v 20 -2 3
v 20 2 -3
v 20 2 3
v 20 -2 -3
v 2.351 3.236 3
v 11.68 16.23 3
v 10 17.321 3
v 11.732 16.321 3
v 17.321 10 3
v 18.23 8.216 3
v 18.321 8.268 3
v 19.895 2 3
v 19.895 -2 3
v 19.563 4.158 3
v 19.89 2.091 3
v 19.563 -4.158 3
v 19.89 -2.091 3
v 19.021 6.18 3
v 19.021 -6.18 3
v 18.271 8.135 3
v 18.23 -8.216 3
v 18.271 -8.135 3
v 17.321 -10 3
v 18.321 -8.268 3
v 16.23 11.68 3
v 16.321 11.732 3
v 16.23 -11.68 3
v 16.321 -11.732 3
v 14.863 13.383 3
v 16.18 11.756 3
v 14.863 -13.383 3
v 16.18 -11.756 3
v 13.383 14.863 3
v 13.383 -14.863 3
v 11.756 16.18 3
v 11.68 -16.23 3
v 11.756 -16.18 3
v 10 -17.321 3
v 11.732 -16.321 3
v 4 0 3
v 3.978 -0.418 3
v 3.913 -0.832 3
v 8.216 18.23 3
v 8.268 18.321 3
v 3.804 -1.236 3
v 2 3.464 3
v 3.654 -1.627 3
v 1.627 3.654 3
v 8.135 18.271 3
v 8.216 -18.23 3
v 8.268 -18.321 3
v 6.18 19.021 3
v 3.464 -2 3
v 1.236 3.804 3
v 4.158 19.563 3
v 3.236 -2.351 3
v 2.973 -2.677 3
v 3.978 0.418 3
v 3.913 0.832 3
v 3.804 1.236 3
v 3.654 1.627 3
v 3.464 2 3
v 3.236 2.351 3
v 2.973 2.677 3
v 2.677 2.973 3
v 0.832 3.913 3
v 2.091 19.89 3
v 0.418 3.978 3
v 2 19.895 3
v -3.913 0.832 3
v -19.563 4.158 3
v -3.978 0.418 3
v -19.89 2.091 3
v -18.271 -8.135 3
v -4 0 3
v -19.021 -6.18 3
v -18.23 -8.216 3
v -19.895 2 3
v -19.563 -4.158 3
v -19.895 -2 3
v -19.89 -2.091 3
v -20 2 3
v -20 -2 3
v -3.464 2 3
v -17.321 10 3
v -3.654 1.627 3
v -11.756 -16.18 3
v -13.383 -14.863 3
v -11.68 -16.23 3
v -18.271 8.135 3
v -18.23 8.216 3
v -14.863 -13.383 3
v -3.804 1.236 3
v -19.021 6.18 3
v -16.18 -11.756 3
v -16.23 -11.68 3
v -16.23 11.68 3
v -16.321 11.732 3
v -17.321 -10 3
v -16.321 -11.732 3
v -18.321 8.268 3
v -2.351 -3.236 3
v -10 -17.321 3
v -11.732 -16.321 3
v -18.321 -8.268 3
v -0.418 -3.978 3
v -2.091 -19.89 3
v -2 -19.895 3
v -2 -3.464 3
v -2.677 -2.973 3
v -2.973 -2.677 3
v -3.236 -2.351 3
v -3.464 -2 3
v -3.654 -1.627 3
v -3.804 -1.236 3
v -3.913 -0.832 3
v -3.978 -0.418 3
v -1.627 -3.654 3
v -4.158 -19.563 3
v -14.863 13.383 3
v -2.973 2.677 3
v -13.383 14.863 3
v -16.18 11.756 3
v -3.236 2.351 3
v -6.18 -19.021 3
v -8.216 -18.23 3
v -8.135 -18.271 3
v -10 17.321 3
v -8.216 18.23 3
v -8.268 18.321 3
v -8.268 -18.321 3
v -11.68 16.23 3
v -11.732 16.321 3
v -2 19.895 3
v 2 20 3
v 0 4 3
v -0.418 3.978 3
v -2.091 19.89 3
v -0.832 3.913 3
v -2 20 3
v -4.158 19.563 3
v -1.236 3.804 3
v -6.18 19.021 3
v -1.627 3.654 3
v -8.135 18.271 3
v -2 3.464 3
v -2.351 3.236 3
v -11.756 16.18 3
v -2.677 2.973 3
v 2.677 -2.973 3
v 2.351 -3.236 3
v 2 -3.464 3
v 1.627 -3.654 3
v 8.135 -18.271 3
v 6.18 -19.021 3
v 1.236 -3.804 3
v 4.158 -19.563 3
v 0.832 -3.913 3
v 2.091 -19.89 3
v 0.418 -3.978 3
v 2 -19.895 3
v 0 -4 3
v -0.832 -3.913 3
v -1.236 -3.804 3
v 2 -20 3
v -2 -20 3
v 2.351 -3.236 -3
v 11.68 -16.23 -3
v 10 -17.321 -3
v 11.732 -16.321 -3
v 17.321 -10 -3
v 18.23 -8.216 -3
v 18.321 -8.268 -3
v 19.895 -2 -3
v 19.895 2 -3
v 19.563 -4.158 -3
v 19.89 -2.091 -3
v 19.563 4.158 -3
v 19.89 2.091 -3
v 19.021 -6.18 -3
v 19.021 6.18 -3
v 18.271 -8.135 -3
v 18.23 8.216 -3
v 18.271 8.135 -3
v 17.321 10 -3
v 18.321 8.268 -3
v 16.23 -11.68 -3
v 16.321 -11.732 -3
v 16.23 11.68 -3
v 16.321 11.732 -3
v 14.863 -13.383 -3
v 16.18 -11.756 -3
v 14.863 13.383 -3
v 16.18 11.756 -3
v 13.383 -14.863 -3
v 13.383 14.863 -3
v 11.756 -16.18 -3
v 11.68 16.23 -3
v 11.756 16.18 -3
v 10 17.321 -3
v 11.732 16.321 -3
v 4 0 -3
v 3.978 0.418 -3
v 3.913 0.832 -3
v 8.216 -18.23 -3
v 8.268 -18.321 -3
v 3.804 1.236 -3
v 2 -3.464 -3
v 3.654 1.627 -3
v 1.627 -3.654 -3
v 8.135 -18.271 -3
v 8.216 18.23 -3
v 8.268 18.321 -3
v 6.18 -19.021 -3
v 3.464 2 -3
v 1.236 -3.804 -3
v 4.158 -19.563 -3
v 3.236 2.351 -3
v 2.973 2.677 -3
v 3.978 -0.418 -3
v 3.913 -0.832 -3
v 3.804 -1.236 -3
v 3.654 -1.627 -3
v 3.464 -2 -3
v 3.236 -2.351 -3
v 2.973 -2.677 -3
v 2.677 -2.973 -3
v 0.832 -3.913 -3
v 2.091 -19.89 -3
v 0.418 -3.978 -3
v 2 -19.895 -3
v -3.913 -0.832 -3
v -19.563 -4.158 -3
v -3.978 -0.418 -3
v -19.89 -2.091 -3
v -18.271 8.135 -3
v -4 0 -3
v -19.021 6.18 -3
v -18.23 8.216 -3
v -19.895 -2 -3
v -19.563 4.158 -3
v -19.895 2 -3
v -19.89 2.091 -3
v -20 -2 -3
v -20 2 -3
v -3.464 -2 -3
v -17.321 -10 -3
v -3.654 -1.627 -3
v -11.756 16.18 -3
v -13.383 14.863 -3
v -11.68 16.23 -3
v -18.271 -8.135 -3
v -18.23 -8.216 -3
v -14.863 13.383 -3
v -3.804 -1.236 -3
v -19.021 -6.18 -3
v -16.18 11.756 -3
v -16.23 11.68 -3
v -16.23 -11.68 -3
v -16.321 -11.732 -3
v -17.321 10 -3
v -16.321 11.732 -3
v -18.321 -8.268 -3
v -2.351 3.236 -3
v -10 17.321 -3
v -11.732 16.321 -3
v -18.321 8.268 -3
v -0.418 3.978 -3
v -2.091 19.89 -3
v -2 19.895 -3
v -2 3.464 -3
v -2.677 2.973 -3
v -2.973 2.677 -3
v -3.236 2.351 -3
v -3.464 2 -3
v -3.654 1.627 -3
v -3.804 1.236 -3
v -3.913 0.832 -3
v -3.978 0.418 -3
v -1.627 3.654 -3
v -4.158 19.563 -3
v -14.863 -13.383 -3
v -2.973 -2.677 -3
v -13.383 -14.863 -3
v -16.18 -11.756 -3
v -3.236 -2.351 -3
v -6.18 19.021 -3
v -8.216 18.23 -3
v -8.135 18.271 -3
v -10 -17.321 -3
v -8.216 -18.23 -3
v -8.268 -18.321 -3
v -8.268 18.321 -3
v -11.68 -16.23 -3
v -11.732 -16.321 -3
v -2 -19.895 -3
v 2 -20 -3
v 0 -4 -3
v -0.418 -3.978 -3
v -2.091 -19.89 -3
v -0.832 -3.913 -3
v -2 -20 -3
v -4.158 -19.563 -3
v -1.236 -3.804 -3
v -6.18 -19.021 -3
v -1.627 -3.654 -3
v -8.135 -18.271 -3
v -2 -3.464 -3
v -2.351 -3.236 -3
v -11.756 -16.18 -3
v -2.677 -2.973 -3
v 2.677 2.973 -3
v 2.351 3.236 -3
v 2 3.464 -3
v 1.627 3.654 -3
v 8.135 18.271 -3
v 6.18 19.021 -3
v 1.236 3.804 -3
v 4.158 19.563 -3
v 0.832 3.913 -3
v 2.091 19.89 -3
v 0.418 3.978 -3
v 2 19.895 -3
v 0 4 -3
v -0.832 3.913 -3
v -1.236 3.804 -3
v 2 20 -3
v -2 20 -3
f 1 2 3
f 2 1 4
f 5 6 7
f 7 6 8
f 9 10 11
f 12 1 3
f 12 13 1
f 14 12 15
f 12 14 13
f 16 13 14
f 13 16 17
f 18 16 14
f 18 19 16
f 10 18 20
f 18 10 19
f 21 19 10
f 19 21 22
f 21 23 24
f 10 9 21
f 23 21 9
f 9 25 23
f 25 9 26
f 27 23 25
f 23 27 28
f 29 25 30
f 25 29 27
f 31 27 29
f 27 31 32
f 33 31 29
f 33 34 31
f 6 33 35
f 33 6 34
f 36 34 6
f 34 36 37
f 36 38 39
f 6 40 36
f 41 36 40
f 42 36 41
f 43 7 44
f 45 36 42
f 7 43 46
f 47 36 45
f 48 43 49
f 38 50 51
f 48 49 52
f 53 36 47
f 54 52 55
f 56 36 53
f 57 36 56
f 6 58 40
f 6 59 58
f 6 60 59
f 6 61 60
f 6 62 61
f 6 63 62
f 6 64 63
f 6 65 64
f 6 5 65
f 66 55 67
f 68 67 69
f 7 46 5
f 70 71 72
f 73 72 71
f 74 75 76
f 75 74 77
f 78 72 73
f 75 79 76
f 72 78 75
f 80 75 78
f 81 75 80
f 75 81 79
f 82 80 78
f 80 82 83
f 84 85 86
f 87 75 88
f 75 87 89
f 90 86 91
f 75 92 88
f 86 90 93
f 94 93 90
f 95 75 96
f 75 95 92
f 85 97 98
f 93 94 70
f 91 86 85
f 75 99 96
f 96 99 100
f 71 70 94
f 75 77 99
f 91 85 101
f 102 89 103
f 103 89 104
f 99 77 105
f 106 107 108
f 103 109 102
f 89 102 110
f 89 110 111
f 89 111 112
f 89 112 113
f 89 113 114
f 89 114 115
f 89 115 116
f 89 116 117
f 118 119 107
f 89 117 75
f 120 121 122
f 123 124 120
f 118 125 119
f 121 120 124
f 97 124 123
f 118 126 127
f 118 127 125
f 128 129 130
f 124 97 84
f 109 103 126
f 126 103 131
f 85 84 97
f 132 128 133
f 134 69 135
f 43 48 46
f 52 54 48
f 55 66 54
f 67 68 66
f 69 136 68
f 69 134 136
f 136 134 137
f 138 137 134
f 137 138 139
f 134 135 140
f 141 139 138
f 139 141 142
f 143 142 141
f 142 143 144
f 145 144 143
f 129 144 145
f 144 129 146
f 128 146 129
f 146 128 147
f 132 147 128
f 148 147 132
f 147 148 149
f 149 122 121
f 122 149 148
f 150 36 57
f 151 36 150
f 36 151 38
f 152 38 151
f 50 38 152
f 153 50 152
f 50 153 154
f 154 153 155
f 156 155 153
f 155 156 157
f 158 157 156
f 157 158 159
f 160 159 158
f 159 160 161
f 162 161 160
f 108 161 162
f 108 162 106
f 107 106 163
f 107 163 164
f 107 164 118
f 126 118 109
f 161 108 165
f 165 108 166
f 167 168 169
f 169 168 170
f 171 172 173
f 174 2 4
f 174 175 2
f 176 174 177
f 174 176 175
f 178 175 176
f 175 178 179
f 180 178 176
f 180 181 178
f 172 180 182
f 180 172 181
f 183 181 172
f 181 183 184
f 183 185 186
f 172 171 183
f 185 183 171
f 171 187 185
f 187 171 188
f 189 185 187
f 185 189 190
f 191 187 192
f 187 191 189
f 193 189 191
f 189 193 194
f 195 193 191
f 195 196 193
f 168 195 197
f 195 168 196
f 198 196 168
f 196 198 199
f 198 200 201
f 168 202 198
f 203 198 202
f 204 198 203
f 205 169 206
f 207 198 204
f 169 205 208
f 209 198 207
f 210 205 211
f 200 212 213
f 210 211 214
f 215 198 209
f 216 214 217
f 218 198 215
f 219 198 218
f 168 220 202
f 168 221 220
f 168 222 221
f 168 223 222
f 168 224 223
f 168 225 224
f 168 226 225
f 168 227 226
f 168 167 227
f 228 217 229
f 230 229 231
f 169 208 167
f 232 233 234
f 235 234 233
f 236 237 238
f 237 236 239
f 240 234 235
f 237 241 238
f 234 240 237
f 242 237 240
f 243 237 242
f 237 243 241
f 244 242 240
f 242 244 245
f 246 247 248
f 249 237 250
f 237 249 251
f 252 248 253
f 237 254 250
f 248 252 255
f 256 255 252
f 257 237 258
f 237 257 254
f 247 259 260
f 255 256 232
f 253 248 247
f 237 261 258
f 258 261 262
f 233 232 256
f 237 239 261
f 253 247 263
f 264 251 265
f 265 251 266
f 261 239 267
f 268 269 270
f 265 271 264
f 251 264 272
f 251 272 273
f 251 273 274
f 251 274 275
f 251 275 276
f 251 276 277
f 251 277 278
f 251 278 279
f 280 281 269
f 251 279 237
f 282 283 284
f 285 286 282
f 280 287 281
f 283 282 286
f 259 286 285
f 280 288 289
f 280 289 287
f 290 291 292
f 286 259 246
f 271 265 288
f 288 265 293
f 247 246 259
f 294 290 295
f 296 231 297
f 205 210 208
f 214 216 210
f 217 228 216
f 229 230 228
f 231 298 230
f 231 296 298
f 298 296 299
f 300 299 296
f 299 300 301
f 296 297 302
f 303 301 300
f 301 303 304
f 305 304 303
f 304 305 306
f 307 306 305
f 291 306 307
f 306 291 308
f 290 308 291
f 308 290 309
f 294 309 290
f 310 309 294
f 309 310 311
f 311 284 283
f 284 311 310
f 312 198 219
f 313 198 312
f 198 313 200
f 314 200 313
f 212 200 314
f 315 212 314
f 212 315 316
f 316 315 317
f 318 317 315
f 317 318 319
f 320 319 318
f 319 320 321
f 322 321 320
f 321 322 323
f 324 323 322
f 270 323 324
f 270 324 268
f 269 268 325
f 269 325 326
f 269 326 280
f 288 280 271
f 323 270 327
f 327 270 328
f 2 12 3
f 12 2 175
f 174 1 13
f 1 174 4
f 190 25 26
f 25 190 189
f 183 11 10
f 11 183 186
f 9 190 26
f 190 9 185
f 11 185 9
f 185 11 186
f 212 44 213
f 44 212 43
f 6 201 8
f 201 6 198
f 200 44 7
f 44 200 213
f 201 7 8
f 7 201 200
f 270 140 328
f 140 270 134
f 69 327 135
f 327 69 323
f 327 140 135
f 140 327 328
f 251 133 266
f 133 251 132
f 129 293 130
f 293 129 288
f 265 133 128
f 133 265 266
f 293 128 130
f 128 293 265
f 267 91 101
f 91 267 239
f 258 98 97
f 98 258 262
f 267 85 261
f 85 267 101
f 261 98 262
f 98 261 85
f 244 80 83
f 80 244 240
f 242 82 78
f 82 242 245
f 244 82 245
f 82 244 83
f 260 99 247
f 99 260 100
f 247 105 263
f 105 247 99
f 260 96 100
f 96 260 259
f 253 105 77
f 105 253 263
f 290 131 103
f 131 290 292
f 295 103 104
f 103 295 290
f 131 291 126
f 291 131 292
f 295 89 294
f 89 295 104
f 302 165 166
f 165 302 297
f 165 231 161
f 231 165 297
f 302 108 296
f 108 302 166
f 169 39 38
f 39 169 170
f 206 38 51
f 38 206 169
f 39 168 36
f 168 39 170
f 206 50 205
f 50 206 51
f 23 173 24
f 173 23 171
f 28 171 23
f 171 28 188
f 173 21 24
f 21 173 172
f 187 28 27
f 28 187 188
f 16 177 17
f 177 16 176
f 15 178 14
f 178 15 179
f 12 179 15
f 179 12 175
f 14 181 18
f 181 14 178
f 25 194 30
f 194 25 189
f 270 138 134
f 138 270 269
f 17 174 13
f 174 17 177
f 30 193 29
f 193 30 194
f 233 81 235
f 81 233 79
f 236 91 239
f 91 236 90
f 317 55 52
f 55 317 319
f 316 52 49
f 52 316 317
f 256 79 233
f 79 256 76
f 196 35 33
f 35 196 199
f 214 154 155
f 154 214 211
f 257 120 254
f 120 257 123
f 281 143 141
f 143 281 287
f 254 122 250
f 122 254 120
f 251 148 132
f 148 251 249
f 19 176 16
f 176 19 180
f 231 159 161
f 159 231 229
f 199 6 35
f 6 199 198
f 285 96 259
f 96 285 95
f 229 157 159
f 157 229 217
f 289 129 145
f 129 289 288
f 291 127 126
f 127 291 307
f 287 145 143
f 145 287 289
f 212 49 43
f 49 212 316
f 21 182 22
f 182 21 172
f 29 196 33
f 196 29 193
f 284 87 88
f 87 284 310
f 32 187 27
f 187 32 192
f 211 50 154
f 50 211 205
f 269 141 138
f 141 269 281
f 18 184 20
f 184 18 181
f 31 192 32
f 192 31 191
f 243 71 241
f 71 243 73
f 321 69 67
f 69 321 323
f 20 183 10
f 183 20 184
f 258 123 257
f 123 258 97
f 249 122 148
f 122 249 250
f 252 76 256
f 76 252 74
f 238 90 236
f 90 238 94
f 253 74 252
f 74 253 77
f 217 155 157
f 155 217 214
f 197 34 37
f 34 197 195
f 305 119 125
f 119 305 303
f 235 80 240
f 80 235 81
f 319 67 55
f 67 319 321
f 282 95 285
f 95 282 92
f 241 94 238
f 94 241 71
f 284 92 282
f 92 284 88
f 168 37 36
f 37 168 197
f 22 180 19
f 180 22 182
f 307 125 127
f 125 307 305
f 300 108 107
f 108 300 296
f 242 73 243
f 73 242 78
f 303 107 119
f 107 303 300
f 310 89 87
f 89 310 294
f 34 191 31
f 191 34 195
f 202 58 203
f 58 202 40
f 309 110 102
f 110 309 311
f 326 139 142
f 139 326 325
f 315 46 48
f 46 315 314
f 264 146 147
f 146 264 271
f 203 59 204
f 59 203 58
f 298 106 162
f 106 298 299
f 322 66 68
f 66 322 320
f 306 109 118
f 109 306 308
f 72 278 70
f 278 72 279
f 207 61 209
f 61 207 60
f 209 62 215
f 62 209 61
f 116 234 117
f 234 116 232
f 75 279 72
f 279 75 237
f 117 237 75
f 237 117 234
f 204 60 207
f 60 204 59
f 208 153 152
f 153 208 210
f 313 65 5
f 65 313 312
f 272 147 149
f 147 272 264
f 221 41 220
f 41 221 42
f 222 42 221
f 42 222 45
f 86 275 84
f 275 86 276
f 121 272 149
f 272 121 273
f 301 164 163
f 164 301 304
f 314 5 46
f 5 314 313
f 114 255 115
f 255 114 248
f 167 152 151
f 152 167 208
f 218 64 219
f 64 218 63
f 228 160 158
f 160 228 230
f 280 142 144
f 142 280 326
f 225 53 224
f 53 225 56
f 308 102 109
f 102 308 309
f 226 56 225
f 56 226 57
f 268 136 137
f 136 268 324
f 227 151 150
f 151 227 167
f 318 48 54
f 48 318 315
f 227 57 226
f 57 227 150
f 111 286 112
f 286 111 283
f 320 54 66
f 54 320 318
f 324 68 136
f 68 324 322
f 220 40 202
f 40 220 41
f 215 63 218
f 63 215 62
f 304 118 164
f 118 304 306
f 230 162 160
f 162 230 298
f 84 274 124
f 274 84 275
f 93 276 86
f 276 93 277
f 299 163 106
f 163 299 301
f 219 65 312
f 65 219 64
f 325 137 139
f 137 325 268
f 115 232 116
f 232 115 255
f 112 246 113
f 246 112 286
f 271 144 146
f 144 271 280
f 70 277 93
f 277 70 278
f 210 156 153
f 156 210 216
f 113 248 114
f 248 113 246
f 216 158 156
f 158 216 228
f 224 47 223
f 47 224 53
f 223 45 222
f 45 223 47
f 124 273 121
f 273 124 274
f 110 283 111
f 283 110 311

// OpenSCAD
// Demo: Parametric gear
$fn = 60;

module gear(teeth = 12, radius = 20, height = 6, hole = 5) {
  difference() {
    union() {
      cylinder(r = radius, h = height, center = true);
      for (i = [0:teeth-1]) {
        rotate([0, 0, i * 360 / teeth])
          translate([radius * 0.85, 0, 0])
            cube([radius * 0.3, radius * 0.2, height], center = true);
      }
    }
    cylinder(r = hole, h = height + 1, center = true);
  }
}

gear(teeth = 12, radius = 20, height = 6, hole = 4);
